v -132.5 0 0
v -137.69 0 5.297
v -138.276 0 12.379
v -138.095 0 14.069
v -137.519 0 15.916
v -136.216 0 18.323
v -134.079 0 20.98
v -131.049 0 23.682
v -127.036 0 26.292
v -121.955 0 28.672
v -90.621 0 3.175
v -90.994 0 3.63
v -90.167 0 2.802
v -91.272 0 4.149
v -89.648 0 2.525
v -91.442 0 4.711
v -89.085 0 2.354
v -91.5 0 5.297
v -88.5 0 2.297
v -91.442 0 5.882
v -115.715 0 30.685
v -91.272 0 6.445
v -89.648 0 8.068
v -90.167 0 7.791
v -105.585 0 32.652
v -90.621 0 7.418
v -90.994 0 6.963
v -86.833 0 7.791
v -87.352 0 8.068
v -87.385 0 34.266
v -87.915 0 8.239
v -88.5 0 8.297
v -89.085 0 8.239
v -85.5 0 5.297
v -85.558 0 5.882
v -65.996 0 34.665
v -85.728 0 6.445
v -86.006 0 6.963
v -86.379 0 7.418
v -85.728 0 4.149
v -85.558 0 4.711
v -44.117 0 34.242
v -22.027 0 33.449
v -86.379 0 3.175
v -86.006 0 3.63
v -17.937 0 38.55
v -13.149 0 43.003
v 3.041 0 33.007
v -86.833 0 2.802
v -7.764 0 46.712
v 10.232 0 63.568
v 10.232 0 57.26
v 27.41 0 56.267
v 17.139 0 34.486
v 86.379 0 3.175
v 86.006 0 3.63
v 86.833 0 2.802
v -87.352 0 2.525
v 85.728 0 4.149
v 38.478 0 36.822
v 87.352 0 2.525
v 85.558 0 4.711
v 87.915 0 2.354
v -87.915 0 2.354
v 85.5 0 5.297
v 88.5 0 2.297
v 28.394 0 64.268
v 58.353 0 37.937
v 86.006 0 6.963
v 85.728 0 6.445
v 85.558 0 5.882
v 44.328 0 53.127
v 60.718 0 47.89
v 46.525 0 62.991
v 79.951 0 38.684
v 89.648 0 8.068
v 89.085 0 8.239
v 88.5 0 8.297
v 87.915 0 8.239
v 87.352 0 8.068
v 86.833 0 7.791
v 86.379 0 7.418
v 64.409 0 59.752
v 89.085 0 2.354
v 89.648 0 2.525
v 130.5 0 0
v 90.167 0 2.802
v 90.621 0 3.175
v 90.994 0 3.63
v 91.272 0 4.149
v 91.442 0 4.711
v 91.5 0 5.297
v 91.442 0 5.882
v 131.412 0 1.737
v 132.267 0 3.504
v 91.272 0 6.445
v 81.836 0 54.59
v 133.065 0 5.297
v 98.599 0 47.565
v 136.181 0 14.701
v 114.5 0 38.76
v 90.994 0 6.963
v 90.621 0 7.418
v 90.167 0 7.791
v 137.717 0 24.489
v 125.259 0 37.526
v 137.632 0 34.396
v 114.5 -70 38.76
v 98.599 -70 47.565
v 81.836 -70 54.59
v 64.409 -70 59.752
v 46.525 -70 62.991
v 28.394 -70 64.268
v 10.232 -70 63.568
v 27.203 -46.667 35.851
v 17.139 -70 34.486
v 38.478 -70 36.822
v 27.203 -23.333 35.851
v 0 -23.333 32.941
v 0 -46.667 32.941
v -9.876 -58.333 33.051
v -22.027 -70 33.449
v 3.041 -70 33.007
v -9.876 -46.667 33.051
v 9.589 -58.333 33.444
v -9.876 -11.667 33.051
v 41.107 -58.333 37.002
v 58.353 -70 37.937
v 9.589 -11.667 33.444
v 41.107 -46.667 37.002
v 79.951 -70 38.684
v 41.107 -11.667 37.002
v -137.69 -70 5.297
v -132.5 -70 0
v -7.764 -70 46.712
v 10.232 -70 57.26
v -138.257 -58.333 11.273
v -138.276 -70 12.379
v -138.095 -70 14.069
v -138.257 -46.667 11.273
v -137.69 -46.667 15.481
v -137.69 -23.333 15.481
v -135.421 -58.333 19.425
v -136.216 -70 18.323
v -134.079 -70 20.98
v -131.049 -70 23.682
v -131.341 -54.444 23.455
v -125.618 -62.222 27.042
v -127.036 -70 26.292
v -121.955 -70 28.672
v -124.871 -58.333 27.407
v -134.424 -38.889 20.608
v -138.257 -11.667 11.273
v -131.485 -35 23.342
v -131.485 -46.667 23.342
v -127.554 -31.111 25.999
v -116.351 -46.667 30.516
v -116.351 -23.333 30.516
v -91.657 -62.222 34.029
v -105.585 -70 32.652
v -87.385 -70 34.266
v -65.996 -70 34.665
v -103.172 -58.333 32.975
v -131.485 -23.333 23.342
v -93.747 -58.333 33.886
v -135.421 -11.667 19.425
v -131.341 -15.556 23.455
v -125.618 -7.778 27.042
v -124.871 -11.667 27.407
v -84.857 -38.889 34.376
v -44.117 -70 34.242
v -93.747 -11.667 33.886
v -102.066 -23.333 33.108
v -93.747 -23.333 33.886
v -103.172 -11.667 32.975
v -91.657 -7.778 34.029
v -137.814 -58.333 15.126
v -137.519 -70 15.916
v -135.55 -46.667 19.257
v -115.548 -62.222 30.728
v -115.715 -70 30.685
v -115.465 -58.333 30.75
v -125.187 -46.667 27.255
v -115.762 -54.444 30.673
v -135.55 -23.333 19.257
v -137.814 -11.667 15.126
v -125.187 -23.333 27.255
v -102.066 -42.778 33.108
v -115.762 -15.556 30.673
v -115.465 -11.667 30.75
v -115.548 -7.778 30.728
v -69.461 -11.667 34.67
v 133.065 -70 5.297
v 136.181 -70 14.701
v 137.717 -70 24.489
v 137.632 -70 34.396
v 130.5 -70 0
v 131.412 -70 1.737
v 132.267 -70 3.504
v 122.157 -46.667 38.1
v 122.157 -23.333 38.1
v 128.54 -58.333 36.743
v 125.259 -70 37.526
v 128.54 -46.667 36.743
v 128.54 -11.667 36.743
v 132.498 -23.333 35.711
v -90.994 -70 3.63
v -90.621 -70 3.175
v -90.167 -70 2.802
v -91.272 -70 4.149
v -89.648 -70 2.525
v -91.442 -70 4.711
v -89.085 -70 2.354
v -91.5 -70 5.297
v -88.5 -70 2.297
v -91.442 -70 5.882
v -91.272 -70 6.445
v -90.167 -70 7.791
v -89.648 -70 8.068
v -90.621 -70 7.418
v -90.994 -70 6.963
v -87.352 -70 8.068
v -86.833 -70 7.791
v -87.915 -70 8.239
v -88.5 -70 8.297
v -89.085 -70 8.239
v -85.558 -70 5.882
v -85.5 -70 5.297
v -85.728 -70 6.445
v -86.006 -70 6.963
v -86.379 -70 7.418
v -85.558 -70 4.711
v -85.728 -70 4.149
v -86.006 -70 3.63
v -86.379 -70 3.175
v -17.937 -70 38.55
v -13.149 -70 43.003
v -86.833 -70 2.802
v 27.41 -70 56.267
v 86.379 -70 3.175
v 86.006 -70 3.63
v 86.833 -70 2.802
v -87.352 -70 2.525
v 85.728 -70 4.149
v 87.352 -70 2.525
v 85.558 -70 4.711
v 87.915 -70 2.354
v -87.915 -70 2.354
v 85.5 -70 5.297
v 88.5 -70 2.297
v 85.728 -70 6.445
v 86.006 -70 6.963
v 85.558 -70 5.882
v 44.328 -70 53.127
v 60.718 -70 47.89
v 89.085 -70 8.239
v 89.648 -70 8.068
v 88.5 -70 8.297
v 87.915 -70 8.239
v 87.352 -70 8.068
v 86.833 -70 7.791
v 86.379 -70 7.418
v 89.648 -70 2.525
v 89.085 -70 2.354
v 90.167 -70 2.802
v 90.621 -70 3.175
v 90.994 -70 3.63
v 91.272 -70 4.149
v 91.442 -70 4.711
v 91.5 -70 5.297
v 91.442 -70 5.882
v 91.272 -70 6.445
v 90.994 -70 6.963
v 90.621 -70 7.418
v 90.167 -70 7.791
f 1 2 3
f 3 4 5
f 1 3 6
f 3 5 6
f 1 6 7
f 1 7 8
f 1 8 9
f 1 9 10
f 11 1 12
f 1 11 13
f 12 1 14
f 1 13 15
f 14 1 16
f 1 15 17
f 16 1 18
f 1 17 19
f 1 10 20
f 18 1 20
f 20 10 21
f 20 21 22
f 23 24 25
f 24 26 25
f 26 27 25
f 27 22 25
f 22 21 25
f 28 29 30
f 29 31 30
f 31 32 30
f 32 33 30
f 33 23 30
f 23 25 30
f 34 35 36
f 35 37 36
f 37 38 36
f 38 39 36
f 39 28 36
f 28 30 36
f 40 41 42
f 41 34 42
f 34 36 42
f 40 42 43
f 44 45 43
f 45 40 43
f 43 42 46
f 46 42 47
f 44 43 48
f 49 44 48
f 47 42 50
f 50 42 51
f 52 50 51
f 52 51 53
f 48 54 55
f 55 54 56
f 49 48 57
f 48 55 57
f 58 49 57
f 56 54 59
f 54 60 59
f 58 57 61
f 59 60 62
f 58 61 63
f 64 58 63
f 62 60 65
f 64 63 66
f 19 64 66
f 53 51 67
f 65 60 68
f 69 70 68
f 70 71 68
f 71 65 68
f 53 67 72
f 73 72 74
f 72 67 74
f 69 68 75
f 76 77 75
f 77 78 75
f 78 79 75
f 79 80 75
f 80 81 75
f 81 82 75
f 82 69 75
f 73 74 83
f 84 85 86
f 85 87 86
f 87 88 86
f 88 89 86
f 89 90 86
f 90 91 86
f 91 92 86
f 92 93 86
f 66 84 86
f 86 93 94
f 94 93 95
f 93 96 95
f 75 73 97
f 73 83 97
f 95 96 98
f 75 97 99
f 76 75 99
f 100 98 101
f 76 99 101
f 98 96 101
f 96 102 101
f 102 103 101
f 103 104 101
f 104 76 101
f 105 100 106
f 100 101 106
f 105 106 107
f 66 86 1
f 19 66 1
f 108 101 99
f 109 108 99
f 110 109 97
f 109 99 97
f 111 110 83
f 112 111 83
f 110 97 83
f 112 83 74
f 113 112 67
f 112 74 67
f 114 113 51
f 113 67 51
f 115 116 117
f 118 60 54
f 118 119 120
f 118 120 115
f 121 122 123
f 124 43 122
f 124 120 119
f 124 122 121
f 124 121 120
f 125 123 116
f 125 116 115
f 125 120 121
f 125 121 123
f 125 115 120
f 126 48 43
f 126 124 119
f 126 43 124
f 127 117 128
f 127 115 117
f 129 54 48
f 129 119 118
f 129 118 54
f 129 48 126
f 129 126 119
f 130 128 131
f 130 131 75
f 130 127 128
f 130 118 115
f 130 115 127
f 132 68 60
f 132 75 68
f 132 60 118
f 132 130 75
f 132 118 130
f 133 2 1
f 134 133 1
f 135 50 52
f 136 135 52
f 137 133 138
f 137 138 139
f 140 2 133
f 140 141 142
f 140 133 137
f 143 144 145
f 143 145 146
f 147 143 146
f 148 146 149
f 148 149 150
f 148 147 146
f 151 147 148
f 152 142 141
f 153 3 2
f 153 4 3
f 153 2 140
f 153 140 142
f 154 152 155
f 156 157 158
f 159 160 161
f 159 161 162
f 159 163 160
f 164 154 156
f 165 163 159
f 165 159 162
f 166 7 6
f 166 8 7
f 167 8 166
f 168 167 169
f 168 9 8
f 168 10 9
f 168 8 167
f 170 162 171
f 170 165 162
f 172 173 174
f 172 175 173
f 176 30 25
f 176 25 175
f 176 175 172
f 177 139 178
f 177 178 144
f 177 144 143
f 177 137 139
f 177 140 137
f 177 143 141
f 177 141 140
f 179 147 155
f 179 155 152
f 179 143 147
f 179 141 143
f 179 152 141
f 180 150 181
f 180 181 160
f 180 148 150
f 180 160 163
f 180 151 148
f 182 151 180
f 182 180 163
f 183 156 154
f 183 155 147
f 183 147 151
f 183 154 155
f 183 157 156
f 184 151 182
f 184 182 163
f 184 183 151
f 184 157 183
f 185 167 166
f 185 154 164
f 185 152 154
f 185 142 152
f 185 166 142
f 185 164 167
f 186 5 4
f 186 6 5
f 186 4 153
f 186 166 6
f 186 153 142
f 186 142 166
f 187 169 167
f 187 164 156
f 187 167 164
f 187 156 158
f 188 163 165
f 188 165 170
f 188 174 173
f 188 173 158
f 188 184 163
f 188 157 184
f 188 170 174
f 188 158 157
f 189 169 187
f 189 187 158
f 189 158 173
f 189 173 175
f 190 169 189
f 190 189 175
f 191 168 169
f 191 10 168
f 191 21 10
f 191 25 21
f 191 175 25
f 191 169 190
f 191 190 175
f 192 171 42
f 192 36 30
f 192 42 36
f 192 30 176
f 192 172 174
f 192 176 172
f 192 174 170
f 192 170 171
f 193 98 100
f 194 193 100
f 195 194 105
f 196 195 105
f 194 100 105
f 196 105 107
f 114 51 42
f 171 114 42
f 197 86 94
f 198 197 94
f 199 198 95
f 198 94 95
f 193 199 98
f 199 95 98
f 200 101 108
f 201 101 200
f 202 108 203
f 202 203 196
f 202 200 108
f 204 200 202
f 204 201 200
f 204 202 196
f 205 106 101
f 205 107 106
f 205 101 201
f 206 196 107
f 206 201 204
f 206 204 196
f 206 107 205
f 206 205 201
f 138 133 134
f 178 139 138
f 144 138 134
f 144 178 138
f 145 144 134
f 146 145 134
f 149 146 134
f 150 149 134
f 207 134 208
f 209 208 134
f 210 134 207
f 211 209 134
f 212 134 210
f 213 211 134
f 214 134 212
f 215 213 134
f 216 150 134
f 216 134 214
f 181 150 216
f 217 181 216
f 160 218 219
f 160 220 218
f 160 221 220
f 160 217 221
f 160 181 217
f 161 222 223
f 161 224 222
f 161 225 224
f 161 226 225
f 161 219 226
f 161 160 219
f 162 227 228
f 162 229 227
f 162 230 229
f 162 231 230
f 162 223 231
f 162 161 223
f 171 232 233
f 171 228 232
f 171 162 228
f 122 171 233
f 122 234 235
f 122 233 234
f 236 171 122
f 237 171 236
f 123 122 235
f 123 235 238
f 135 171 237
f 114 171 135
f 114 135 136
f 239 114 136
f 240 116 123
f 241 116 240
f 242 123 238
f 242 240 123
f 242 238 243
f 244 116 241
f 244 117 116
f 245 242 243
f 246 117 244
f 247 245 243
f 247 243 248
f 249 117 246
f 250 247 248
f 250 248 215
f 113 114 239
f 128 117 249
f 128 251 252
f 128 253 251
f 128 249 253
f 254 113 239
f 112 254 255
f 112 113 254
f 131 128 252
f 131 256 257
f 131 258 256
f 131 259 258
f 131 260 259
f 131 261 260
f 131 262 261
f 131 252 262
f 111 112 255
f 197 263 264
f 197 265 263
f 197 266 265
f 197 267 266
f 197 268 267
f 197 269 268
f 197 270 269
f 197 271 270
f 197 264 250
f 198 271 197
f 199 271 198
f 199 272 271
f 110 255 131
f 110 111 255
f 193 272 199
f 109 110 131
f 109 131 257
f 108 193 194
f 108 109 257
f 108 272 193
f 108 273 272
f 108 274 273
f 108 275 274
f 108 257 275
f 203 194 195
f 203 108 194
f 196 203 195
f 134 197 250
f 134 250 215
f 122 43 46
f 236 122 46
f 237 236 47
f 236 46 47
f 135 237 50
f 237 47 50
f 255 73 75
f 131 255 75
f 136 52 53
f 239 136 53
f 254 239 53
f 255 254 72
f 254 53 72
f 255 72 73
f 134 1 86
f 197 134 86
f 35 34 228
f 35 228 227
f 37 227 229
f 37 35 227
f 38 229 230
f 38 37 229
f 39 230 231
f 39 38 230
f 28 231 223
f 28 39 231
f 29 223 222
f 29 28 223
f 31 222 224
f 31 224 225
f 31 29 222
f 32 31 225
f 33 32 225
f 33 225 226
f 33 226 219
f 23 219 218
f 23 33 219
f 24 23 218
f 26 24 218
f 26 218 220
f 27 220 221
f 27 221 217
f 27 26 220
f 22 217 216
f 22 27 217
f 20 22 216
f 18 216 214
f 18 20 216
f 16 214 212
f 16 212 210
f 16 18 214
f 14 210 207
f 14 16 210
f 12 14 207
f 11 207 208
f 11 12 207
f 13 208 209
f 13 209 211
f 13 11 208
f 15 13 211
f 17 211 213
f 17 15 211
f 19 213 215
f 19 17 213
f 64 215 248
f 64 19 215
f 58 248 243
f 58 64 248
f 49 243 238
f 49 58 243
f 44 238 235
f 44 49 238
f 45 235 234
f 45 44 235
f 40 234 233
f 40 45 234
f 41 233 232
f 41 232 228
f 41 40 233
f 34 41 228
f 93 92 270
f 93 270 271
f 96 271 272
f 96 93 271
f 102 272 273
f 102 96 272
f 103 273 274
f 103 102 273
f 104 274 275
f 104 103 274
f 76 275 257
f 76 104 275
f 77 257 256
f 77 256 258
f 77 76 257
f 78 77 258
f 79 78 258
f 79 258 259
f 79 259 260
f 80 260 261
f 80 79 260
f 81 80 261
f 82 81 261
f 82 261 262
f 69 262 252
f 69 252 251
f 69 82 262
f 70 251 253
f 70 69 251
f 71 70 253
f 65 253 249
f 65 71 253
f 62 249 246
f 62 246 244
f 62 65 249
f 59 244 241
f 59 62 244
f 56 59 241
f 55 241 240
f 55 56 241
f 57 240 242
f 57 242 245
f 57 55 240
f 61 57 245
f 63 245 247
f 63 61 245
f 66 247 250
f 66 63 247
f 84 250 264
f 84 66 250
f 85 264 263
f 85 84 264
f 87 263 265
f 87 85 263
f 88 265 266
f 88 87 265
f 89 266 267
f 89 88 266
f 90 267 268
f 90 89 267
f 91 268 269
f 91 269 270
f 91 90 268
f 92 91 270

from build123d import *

# Parameters (mm, degrees)
F0_R     = 3
F1_DEPTH = 70


with BuildPart() as f1:
    # F0 (on Front) → F1 (new body)
    with BuildSketch(Plane.XZ):
        with BuildLine():
            Line((-111.5, 0), (-65.5, 0))
            Line((-65.5, 0), (65.5, 0))
            Line((65.5, 0), (111.5, 0))
            Line((111.5, 0), (130.5, 0))
            ThreePointArc((130.5, 0), (131.8468448465, 2.6171085291), (133.0645310662, 5.2967518568))
            ThreePointArc((133.0645310662, 5.2967518568), (137.1503404683, 19.5633158944), (137.6323364973, 34.3955904245))
            add(Edge.make_bspline(
                [(114.4997701049, 38.760419935), (124.1219228185, 38.3494152284), (125.8567408625, 37.3358803896), (137.6323364973, 34.3955904245)],
                knots=[0.8740312085, 0.8740312085, 0.8740312085, 0.8740312085, 1, 1, 1, 1], degree=3))
            add(Edge.make_bspline(
                [(79.9506717595, 38.6835931743), (93.8518742864, 39.0314730271), (106.7403745376, 39.0918580438), (114.4997701049, 38.760419935)],
                knots=[0.7724487755, 0.7724487755, 0.7724487755, 0.7724487755, 0.8740312085, 0.8740312085, 0.8740312085, 0.8740312085], degree=3))
            add(Edge.make_bspline(
                [(-22.0270791966, 33.4487550395), (-13.3076197718, 33.1256909406), (10.5878315252, 32.3576068296), (18.9262232464, 36.1642627718), (60.6467167467, 38.2005085624), (79.9506717595, 38.6835931743)],
                knots=[0.4319986084, 0.4319986084, 0.4319986084, 0.4319986084, 0.4955864164, 0.6313859638, 0.7724487755, 0.7724487755, 0.7724487755, 0.7724487755], degree=3))
            add(Edge.make_bspline(
                [(-44.1169762461, 34.242061633), (-36.3474696979, 34.0022425737), (-28.8507947828, 33.7015800621), (-22.0270791966, 33.4487550395)],
                knots=[0.3822357624, 0.3822357624, 0.3822357624, 0.3822357624, 0.4319986084, 0.4319986084, 0.4319986084, 0.4319986084], degree=3))
            add(Edge.make_bspline(
                [(-137.6901865005, 5.2967518568), (-138.1361705468, 10.5366267583), (-139.7469723452, 15.8994790424), (-122.3906804514, 35.2619318066), (-70.1488325634, 35.045579238), (-44.1169762461, 34.242061633)],
                knots=[0, 0, 0, 0, 0.0828561207, 0.2155045488, 0.3822357624, 0.3822357624, 0.3822357624, 0.3822357624], degree=3))
            Line((-137.6901865005, 5.2967518568), (-132.5, 0))
            Line((-132.5, 0), (-111.5, 0))
        make_face()
        with Locations((-88.5, 5.2967518568)):
            Circle(F0_R, mode=Mode.SUBTRACT)
        with Locations((88.5, 5.2967518568)):
            Circle(F0_R, mode=Mode.SUBTRACT)
        with BuildLine():
            Line((10.2321720927, 63.5675959729), (-44.1169762461, 34.242061633))
            add(Edge.make_bspline(
                [(-44.1169762461, 34.242061633), (-36.3474696979, 34.0022425737), (-28.8507947828, 33.7015800621), (-22.0270791966, 33.4487550395)],
                knots=[0.3822357624, 0.3822357624, 0.3822357624, 0.3822357624, 0.4319986084, 0.4319986084, 0.4319986084, 0.4319986084], degree=3))
            ThreePointArc((-22.0270791966, 33.4487550395), (-15.6242101117, 40.8638805308), (-7.76393155, 46.7116869146))
            Line((-7.76393155, 46.7116869146), (10.2321720927, 57.2603466742))
            ThreePointArc((10.2321720927, 57.2603466742), (35.9182812309, 54.9632721639), (60.7178164546, 47.8896728921))
            Line((60.7178164546, 47.8896728921), (79.9506717595, 38.6835931743))
            add(Edge.make_bspline(
                [(79.9506717595, 38.6835931743), (93.8518742864, 39.0314730271), (106.7403745376, 39.0918580438), (114.4997701049, 38.760419935)],
                knots=[0.7724487755, 0.7724487755, 0.7724487755, 0.7724487755, 0.8740312085, 0.8740312085, 0.8740312085, 0.8740312085], degree=3))
            ThreePointArc((114.4997701049, 38.760419935), (64.4092764451, 59.7522704848), (10.2321720927, 63.5675959729))
        make_face()
    extrude(amount=F1_DEPTH)


solid = f1.part
